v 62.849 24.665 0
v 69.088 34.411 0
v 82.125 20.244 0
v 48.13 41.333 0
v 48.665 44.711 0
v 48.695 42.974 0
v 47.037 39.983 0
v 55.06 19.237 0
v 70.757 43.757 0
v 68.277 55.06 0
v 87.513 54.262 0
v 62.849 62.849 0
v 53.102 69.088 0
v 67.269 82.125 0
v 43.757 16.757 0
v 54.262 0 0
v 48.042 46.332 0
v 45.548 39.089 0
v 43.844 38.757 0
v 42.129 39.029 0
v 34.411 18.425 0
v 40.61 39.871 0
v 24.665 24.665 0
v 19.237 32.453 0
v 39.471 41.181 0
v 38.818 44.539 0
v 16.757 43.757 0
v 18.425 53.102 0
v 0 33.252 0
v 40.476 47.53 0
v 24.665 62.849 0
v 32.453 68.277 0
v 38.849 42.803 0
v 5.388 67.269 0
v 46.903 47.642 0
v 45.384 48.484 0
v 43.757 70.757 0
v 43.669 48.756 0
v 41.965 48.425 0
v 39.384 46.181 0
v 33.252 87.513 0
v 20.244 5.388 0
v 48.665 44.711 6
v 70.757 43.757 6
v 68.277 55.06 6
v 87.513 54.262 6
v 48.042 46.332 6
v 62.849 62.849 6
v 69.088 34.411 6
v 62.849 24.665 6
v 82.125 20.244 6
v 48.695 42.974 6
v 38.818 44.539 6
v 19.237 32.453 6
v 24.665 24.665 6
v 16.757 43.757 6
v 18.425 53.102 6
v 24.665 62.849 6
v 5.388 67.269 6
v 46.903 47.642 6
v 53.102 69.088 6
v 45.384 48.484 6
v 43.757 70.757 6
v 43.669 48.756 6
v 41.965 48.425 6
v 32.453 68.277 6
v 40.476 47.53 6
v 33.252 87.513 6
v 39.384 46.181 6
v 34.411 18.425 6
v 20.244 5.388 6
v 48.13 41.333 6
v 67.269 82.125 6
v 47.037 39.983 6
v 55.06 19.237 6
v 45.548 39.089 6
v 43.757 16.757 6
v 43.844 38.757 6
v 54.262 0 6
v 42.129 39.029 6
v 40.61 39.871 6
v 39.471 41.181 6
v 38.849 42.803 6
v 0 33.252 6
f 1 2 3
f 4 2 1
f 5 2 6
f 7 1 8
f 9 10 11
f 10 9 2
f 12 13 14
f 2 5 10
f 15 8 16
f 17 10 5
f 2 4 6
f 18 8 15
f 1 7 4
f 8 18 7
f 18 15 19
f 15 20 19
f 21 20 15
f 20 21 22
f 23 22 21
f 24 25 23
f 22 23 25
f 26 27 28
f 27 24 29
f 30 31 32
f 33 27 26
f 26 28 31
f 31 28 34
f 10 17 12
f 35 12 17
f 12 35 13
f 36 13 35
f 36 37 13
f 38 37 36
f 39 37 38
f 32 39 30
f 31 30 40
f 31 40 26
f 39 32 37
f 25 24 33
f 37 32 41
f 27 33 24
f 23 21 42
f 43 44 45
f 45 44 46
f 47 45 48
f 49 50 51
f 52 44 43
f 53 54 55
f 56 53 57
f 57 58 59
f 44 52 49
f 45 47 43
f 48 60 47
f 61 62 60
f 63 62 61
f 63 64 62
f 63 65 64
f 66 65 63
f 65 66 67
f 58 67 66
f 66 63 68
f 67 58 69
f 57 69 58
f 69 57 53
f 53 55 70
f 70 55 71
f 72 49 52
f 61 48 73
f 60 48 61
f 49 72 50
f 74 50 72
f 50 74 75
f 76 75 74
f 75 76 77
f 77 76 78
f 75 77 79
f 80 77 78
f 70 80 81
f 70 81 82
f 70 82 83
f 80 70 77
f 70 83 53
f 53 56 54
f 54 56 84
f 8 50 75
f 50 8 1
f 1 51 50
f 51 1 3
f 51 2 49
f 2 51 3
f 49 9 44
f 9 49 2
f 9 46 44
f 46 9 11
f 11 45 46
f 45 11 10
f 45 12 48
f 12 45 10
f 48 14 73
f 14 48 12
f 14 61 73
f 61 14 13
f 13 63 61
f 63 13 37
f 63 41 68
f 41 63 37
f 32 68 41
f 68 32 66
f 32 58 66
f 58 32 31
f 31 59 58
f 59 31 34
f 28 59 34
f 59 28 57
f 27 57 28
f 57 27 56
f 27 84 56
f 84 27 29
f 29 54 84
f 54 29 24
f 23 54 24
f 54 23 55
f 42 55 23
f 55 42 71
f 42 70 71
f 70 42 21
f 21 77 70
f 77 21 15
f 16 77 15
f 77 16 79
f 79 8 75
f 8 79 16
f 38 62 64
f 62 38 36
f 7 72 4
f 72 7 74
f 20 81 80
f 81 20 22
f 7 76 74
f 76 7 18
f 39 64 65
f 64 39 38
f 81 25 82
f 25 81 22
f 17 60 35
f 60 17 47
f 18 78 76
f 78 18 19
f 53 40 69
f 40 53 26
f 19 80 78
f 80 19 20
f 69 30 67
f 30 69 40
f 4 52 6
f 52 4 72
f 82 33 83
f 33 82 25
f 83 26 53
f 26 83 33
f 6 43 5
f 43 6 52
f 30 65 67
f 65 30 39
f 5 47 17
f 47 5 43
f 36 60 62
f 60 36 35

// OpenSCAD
$fn = 32;

// ----------------------------------------------------------------------
// Star wheel: 8-point ratchet, R45
// ----------------------------------------------------------------------

// --- parameters (mm) ---
n_points = 8;             // number of points / teeth
r_out = 45;               // tip radius
r_in = 27;                // root radius
bore_r = 5;               // centre bore radius
plate_t = 6;              // plate thickness, Z (extrusion height)
bore_d = 10;              // centre bore diameter

profile = [[70.757, 43.757], [87.513, 54.262], [68.277, 55.06], [62.849, 62.849], [67.269, 82.125], [53.102, 69.088], [43.757, 70.757], [33.252, 87.513], [32.453, 68.277], [24.665, 62.849], [5.388, 67.269], [18.425, 53.102], [16.757, 43.757], [0, 33.252], [19.237, 32.453], [24.665, 24.665], [20.244, 5.388], [34.411, 18.425], [43.757, 16.757], [54.262, 0], [55.06, 19.237], [62.849, 24.665], [82.125, 20.244], [69.088, 34.411]];  // primary outline, 24 points, counter clockwise
void_1 = [[48.665, 44.711], [48.042, 46.332], [46.903, 47.642], [45.384, 48.484], [43.669, 48.756], [41.965, 48.425], [40.476, 47.53], [39.384, 46.181], [38.818, 44.539], [38.849, 42.803], [39.471, 41.181], [40.61, 39.871], [42.129, 39.029], [43.844, 38.757], [45.548, 39.089], [47.037, 39.983], [48.13, 41.333], [48.695, 42.974]];  // centre bore, 18 points

// --- the one profile operation ---
difference() {
  linear_extrude(height = plate_t) polygon(points = profile);
  translate([0, 0, -1])
    linear_extrude(height = plate_t + 2) polygon(points = void_1);
}
